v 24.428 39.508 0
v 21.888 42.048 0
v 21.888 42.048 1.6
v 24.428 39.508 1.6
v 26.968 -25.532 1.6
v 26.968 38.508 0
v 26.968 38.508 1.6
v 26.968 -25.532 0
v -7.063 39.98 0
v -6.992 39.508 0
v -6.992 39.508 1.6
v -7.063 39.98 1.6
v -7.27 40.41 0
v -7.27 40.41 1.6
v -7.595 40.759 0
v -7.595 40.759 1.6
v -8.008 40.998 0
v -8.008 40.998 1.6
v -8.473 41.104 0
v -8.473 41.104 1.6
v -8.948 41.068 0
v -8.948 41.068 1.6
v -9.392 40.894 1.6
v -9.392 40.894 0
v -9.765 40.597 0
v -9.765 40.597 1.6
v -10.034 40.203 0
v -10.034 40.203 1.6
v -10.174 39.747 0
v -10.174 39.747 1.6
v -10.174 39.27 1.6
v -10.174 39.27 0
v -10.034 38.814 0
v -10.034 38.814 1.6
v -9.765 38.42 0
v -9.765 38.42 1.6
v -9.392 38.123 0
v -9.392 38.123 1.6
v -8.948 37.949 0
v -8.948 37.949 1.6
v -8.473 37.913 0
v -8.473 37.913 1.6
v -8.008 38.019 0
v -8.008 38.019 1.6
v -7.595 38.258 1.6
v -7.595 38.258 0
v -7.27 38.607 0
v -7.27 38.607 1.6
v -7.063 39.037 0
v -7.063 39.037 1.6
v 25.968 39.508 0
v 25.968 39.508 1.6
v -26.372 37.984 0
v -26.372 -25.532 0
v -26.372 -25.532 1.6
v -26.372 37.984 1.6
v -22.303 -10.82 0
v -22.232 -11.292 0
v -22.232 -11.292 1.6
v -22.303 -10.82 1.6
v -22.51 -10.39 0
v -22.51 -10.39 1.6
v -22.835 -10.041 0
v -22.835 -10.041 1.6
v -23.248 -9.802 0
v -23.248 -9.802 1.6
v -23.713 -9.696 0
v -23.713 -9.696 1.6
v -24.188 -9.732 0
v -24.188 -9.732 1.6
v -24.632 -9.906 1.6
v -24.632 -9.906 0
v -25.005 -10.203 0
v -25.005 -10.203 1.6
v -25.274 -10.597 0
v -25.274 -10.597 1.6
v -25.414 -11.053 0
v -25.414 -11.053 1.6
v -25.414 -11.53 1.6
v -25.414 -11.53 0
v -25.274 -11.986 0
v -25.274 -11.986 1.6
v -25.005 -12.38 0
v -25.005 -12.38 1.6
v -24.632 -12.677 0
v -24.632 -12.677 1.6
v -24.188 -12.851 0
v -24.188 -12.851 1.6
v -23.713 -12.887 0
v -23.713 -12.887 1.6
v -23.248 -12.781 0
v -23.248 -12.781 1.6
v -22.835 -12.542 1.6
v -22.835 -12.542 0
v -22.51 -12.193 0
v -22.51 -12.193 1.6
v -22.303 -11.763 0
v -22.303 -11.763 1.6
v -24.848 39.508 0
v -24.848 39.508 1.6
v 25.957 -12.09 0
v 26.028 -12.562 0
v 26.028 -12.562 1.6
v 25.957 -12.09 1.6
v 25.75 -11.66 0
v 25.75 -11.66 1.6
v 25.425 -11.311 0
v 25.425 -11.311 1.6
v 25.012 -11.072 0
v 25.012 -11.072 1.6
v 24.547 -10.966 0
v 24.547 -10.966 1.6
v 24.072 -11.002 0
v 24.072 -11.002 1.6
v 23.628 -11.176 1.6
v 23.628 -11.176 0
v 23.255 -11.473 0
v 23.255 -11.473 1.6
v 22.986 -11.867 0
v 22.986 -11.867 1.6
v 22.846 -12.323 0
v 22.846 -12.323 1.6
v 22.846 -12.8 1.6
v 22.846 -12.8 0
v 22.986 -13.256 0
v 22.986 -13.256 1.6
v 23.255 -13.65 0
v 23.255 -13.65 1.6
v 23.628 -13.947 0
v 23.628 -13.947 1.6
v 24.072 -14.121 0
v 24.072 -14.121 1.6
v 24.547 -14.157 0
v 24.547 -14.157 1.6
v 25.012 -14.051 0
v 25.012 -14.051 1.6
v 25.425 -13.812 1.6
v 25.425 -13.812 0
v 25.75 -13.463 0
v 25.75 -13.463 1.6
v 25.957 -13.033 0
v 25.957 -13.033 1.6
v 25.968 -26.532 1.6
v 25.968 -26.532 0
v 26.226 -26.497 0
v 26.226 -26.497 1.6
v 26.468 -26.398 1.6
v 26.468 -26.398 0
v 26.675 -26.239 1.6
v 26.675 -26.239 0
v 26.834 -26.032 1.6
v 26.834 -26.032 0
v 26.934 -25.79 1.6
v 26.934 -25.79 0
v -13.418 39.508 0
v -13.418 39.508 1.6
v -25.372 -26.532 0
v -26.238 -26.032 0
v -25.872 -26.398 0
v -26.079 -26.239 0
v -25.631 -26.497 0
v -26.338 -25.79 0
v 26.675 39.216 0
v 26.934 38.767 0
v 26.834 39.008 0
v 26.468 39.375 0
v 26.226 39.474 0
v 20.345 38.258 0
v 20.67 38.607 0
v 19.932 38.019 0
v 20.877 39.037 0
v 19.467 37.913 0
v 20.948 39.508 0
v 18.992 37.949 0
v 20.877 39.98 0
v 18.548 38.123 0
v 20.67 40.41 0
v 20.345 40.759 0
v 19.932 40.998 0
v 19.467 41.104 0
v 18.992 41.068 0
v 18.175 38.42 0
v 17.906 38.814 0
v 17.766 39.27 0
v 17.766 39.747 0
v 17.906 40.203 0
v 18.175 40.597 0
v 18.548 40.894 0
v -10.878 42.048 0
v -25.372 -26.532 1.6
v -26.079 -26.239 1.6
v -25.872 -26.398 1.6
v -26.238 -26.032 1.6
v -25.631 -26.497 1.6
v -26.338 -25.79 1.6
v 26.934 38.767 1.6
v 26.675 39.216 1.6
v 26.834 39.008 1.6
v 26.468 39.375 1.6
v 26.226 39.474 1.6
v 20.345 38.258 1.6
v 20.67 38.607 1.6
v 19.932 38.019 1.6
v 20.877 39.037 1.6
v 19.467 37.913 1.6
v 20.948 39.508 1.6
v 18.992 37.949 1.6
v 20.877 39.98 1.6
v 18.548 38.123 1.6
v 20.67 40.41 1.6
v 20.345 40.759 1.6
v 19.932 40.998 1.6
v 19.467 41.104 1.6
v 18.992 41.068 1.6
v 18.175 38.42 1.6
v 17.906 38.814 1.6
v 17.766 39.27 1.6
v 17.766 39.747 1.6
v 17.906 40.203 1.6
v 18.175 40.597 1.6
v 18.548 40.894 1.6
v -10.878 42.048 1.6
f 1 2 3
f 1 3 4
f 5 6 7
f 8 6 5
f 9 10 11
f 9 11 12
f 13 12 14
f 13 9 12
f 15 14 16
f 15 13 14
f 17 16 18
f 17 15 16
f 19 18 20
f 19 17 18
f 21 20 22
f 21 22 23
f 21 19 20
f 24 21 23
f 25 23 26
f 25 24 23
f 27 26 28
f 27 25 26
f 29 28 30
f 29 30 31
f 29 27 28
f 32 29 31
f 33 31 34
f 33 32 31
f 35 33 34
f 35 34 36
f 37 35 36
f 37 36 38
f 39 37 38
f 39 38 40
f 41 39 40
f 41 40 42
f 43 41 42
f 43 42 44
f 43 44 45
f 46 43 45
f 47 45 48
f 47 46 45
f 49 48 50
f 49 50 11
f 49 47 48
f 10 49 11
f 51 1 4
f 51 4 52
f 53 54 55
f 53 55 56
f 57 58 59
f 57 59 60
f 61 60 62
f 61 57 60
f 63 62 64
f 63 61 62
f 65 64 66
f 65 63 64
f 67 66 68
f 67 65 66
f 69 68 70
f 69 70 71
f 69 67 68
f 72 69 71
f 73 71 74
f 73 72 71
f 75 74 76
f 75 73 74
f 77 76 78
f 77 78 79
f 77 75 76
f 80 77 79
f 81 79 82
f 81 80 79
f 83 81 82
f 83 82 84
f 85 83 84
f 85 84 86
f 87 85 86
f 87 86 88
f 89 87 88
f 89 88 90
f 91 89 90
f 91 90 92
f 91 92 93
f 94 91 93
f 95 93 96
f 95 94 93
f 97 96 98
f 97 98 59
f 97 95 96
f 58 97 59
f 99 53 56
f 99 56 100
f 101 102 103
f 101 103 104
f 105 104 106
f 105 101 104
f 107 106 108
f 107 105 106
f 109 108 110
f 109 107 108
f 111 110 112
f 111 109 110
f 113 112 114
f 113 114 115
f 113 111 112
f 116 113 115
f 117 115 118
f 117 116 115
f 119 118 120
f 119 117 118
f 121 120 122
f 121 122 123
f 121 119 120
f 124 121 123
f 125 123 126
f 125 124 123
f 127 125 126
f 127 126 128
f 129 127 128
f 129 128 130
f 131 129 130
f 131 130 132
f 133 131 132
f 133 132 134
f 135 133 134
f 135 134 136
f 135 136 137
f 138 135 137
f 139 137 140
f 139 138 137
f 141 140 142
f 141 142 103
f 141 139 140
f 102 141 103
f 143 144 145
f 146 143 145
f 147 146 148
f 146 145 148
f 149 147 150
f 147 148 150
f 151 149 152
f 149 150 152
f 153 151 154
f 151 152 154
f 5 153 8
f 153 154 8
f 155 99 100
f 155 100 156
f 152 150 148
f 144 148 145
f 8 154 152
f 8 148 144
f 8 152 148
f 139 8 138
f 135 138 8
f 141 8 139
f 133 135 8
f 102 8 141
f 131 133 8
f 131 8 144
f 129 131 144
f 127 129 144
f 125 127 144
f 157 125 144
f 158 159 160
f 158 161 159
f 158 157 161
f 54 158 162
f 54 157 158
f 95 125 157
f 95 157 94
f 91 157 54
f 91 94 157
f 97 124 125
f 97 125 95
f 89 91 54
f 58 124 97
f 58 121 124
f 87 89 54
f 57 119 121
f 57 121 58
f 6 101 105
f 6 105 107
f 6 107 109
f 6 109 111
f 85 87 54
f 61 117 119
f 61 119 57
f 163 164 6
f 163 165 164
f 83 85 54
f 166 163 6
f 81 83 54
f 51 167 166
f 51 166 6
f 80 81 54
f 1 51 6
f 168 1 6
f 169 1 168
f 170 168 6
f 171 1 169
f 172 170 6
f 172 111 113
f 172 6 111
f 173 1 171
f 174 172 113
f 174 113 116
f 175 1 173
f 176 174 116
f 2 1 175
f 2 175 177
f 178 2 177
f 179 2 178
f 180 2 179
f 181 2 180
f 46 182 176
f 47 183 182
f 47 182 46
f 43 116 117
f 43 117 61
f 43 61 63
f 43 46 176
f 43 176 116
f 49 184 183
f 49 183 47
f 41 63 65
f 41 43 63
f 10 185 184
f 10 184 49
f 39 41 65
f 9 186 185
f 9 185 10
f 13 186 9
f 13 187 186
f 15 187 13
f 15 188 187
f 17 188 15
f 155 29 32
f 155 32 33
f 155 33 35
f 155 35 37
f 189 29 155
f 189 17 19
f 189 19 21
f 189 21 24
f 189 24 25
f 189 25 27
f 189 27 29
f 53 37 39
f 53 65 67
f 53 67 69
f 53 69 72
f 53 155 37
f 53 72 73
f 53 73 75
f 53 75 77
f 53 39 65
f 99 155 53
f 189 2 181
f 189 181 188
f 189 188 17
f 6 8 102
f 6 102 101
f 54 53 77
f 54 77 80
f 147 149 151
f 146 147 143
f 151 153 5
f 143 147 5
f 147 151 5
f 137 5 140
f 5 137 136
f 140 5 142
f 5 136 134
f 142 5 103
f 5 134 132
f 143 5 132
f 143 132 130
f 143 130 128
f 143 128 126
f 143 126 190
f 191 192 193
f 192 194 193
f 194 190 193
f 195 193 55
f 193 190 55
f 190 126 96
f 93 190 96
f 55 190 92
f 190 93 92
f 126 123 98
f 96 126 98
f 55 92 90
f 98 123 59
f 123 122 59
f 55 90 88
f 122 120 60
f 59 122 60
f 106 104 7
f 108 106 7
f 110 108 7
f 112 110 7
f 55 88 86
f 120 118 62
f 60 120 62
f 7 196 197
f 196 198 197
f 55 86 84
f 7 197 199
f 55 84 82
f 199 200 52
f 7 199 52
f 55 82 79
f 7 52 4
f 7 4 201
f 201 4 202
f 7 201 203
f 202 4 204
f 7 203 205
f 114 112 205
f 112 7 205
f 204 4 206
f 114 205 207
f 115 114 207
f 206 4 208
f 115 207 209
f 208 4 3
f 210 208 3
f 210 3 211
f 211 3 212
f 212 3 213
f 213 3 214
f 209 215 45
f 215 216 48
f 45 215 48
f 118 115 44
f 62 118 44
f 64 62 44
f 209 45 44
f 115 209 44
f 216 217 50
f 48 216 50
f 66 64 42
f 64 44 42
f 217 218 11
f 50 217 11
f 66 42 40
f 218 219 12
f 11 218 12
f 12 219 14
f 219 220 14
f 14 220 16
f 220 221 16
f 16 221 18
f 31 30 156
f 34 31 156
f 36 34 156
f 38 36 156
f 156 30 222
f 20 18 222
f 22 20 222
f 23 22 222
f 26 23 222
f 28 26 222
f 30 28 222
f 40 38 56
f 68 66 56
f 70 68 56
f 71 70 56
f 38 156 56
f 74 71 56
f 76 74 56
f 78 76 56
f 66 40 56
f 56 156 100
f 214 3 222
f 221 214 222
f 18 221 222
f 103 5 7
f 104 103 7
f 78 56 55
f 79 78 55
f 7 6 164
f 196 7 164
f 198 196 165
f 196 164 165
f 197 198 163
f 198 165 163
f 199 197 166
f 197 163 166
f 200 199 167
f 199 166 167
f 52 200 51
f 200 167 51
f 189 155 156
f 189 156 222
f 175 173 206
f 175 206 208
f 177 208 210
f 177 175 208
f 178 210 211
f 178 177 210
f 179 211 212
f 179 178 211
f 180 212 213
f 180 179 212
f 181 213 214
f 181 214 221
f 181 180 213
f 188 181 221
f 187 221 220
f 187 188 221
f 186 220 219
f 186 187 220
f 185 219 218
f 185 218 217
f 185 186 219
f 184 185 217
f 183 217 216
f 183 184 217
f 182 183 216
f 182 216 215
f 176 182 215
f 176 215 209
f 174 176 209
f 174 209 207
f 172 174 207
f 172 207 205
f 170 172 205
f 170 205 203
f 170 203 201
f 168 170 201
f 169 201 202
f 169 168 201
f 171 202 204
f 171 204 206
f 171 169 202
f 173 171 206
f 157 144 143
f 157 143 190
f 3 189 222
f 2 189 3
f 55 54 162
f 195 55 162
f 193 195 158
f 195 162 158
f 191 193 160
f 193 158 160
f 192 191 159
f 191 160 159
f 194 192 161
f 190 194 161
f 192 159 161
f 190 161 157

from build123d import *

# Parameters (mm, degrees)
SKETCH_R  = 1.6
PAD_DEPTH = 1.6


with BuildPart() as part:
    # Sketch → Pad (new body)
    with BuildSketch(Plane.XY):
        with BuildLine():
            Line((-10.87834, 42.048496), (21.88766, 42.048496))
            Line((21.88766, 42.048496), (24.42766, 39.508496))
            Line((24.42766, 39.508496), (25.96766, 39.508496))
            ThreePointArc((26.96766, 38.508496), (26.674767, 39.215603), (25.96766, 39.508496))
            Line((26.96766, 38.508496), (26.96766, -25.531504))
            ThreePointArc((25.96766, -26.531504), (26.674767, -26.238611), (26.96766, -25.531504))
            Line((25.96766, -26.531504), (-25.37234, -26.531504))
            ThreePointArc((-26.37234, -25.531504), (-26.079447, -26.238611), (-25.37234, -26.531504))
            Line((-26.37234, -25.531504), (-26.37234, 37.984496))
            Line((-26.37234, 37.984496), (-24.84834, 39.508496))
            Line((-24.84834, 39.508496), (-13.41834, 39.508496))
            Line((-13.41834, 39.508496), (-10.87834, 42.048496))
        make_face()
        with Locations((24.42766, -12.561504)):
            Circle(SKETCH_R, mode=Mode.SUBTRACT)
        with Locations((-23.83234, -11.291504)):
            Circle(SKETCH_R, mode=Mode.SUBTRACT)
        with Locations((-8.59234, 39.508496)):
            Circle(SKETCH_R, mode=Mode.SUBTRACT)
        with Locations((19.34766, 39.508496)):
            Circle(SKETCH_R, mode=Mode.SUBTRACT)
    extrude(amount=PAD_DEPTH)


solid = part.part
